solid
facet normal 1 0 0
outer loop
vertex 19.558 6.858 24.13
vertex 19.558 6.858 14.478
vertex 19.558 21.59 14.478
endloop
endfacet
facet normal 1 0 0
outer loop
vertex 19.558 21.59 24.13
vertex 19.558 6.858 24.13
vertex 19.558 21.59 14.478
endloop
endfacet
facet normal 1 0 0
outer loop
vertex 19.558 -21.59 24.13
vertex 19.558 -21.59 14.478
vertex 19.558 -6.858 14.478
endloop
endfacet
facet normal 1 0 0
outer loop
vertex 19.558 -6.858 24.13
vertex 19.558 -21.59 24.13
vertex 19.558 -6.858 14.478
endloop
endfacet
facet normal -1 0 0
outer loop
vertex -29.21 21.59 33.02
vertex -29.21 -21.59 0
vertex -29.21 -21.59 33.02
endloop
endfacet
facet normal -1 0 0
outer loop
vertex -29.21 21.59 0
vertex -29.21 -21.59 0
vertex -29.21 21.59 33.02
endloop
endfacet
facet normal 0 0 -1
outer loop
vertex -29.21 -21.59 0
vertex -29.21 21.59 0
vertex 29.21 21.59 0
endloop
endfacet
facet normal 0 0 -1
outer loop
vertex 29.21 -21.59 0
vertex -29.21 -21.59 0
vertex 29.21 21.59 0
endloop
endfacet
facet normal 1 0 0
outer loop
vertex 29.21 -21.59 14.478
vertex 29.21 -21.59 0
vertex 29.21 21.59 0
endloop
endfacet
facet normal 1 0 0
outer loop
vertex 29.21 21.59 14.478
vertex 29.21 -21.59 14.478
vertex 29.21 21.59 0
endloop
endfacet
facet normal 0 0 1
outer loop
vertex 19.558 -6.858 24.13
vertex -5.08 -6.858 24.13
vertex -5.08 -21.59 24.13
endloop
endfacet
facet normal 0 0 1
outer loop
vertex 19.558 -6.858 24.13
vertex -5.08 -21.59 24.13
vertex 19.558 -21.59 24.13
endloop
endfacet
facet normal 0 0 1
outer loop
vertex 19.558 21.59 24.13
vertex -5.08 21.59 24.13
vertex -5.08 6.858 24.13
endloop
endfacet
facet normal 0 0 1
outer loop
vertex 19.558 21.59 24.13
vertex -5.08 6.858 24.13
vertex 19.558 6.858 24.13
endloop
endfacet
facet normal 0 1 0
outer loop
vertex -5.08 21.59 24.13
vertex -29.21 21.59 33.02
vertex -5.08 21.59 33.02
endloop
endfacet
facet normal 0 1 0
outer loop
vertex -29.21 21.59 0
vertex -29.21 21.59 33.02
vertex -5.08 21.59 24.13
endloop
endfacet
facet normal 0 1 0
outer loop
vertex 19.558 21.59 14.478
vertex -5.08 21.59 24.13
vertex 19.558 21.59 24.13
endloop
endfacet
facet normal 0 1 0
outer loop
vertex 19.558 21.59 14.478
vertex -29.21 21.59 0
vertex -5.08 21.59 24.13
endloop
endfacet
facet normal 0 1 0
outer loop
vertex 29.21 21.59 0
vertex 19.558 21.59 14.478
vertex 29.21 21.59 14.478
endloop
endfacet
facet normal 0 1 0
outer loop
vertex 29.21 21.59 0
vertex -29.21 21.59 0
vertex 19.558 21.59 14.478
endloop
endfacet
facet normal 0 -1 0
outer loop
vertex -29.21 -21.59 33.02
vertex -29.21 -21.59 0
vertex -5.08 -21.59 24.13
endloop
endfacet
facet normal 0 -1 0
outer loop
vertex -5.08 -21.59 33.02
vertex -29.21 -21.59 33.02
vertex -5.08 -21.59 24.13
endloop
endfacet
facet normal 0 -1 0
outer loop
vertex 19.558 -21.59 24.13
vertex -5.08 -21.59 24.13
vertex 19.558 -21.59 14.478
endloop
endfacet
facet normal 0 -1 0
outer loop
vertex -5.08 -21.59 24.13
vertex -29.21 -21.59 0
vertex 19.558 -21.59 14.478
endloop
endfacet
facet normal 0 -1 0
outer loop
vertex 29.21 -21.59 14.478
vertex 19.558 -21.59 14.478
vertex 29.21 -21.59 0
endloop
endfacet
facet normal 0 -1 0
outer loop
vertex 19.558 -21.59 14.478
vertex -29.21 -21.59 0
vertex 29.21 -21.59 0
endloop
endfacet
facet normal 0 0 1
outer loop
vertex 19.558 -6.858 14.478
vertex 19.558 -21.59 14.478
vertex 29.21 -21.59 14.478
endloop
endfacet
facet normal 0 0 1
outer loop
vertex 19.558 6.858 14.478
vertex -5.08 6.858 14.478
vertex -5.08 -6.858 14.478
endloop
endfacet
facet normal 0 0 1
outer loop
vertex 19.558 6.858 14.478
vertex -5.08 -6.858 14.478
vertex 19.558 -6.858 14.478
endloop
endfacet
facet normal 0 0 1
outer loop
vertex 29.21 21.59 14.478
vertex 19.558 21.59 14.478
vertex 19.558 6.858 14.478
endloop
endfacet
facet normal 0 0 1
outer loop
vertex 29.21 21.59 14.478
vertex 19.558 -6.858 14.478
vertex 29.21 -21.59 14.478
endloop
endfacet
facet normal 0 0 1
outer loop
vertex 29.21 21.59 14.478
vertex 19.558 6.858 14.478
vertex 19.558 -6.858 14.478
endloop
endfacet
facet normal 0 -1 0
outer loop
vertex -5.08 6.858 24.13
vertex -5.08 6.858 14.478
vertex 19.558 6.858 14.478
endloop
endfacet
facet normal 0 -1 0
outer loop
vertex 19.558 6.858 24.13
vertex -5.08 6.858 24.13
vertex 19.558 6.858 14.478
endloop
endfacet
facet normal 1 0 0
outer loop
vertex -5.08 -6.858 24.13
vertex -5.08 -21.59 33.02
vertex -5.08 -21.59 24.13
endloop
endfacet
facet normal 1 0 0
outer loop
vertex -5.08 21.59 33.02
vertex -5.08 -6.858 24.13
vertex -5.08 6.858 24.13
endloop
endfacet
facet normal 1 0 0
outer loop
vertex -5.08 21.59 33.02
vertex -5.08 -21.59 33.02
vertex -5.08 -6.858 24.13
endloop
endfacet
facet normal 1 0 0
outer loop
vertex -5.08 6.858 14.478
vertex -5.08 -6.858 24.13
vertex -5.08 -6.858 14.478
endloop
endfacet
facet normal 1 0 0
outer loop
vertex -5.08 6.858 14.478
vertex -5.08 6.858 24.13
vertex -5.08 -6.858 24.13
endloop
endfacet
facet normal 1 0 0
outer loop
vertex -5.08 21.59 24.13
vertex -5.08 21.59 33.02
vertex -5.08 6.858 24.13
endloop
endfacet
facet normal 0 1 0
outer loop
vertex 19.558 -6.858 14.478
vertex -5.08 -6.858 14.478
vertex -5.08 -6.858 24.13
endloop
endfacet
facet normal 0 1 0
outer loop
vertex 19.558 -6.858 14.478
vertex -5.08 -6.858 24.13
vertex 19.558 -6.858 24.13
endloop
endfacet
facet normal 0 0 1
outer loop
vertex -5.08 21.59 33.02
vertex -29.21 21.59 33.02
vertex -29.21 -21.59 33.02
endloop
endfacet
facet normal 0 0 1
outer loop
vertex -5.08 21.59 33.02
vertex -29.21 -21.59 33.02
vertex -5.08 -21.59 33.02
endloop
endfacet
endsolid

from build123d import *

# Parameters (mm, degrees)
F0_W      = 58.42
F0_H      = 43.18
F1_DEPTH  = 33.02
F2_W      = 44.949538
F2_H      = 18.542
F3_DEPTH  = 21.591
F3_FACE_W = 34.29
F3_FACE_H = 18.542
F4_DEPTH  = 21.591
F5_W      = 24.638
F5_H      = 14.732
F6_DEPTH  = 24.13
F7_W      = 24.638
F7_H      = 14.732
F8_DEPTH  = 24.13


with BuildPart() as f1:
    # F0 (on Top) → F1 (new body)
    with BuildSketch(Plane.XY):
        Rectangle(F0_W, F0_H)
    extrude(amount=F1_DEPTH)

    # F2 (on Front) → F3 (cut, through all)
    with BuildSketch(Plane.XZ):
        with Locations((17.394769, 23.749)):
            Rectangle(F2_W, F2_H)
    extrude(amount=-F3_DEPTH, mode=Mode.SUBTRACT)

    # F3_face (on face) → F4 (cut, through all)
    with BuildSketch(Plane(origin=(12.065, 0, 23.749), x_dir=(1, 0, 0), z_dir=(0, 1, 0))):
        Rectangle(F3_FACE_W, F3_FACE_H)
    extrude(amount=-F4_DEPTH, mode=Mode.SUBTRACT)

    # F5 (on Top) → F6 (join)
    with BuildSketch(Plane.XY):
        with Locations((7.239, 14.224)):
            Rectangle(F5_W, F5_H)
    extrude(amount=F6_DEPTH)

    # F7 (on Top) → F8 (join)
    with BuildSketch(Plane.XY):
        with Locations((7.239, -14.224)):
            Rectangle(F7_W, F7_H)
    extrude(amount=F8_DEPTH)


solid = f1.part
